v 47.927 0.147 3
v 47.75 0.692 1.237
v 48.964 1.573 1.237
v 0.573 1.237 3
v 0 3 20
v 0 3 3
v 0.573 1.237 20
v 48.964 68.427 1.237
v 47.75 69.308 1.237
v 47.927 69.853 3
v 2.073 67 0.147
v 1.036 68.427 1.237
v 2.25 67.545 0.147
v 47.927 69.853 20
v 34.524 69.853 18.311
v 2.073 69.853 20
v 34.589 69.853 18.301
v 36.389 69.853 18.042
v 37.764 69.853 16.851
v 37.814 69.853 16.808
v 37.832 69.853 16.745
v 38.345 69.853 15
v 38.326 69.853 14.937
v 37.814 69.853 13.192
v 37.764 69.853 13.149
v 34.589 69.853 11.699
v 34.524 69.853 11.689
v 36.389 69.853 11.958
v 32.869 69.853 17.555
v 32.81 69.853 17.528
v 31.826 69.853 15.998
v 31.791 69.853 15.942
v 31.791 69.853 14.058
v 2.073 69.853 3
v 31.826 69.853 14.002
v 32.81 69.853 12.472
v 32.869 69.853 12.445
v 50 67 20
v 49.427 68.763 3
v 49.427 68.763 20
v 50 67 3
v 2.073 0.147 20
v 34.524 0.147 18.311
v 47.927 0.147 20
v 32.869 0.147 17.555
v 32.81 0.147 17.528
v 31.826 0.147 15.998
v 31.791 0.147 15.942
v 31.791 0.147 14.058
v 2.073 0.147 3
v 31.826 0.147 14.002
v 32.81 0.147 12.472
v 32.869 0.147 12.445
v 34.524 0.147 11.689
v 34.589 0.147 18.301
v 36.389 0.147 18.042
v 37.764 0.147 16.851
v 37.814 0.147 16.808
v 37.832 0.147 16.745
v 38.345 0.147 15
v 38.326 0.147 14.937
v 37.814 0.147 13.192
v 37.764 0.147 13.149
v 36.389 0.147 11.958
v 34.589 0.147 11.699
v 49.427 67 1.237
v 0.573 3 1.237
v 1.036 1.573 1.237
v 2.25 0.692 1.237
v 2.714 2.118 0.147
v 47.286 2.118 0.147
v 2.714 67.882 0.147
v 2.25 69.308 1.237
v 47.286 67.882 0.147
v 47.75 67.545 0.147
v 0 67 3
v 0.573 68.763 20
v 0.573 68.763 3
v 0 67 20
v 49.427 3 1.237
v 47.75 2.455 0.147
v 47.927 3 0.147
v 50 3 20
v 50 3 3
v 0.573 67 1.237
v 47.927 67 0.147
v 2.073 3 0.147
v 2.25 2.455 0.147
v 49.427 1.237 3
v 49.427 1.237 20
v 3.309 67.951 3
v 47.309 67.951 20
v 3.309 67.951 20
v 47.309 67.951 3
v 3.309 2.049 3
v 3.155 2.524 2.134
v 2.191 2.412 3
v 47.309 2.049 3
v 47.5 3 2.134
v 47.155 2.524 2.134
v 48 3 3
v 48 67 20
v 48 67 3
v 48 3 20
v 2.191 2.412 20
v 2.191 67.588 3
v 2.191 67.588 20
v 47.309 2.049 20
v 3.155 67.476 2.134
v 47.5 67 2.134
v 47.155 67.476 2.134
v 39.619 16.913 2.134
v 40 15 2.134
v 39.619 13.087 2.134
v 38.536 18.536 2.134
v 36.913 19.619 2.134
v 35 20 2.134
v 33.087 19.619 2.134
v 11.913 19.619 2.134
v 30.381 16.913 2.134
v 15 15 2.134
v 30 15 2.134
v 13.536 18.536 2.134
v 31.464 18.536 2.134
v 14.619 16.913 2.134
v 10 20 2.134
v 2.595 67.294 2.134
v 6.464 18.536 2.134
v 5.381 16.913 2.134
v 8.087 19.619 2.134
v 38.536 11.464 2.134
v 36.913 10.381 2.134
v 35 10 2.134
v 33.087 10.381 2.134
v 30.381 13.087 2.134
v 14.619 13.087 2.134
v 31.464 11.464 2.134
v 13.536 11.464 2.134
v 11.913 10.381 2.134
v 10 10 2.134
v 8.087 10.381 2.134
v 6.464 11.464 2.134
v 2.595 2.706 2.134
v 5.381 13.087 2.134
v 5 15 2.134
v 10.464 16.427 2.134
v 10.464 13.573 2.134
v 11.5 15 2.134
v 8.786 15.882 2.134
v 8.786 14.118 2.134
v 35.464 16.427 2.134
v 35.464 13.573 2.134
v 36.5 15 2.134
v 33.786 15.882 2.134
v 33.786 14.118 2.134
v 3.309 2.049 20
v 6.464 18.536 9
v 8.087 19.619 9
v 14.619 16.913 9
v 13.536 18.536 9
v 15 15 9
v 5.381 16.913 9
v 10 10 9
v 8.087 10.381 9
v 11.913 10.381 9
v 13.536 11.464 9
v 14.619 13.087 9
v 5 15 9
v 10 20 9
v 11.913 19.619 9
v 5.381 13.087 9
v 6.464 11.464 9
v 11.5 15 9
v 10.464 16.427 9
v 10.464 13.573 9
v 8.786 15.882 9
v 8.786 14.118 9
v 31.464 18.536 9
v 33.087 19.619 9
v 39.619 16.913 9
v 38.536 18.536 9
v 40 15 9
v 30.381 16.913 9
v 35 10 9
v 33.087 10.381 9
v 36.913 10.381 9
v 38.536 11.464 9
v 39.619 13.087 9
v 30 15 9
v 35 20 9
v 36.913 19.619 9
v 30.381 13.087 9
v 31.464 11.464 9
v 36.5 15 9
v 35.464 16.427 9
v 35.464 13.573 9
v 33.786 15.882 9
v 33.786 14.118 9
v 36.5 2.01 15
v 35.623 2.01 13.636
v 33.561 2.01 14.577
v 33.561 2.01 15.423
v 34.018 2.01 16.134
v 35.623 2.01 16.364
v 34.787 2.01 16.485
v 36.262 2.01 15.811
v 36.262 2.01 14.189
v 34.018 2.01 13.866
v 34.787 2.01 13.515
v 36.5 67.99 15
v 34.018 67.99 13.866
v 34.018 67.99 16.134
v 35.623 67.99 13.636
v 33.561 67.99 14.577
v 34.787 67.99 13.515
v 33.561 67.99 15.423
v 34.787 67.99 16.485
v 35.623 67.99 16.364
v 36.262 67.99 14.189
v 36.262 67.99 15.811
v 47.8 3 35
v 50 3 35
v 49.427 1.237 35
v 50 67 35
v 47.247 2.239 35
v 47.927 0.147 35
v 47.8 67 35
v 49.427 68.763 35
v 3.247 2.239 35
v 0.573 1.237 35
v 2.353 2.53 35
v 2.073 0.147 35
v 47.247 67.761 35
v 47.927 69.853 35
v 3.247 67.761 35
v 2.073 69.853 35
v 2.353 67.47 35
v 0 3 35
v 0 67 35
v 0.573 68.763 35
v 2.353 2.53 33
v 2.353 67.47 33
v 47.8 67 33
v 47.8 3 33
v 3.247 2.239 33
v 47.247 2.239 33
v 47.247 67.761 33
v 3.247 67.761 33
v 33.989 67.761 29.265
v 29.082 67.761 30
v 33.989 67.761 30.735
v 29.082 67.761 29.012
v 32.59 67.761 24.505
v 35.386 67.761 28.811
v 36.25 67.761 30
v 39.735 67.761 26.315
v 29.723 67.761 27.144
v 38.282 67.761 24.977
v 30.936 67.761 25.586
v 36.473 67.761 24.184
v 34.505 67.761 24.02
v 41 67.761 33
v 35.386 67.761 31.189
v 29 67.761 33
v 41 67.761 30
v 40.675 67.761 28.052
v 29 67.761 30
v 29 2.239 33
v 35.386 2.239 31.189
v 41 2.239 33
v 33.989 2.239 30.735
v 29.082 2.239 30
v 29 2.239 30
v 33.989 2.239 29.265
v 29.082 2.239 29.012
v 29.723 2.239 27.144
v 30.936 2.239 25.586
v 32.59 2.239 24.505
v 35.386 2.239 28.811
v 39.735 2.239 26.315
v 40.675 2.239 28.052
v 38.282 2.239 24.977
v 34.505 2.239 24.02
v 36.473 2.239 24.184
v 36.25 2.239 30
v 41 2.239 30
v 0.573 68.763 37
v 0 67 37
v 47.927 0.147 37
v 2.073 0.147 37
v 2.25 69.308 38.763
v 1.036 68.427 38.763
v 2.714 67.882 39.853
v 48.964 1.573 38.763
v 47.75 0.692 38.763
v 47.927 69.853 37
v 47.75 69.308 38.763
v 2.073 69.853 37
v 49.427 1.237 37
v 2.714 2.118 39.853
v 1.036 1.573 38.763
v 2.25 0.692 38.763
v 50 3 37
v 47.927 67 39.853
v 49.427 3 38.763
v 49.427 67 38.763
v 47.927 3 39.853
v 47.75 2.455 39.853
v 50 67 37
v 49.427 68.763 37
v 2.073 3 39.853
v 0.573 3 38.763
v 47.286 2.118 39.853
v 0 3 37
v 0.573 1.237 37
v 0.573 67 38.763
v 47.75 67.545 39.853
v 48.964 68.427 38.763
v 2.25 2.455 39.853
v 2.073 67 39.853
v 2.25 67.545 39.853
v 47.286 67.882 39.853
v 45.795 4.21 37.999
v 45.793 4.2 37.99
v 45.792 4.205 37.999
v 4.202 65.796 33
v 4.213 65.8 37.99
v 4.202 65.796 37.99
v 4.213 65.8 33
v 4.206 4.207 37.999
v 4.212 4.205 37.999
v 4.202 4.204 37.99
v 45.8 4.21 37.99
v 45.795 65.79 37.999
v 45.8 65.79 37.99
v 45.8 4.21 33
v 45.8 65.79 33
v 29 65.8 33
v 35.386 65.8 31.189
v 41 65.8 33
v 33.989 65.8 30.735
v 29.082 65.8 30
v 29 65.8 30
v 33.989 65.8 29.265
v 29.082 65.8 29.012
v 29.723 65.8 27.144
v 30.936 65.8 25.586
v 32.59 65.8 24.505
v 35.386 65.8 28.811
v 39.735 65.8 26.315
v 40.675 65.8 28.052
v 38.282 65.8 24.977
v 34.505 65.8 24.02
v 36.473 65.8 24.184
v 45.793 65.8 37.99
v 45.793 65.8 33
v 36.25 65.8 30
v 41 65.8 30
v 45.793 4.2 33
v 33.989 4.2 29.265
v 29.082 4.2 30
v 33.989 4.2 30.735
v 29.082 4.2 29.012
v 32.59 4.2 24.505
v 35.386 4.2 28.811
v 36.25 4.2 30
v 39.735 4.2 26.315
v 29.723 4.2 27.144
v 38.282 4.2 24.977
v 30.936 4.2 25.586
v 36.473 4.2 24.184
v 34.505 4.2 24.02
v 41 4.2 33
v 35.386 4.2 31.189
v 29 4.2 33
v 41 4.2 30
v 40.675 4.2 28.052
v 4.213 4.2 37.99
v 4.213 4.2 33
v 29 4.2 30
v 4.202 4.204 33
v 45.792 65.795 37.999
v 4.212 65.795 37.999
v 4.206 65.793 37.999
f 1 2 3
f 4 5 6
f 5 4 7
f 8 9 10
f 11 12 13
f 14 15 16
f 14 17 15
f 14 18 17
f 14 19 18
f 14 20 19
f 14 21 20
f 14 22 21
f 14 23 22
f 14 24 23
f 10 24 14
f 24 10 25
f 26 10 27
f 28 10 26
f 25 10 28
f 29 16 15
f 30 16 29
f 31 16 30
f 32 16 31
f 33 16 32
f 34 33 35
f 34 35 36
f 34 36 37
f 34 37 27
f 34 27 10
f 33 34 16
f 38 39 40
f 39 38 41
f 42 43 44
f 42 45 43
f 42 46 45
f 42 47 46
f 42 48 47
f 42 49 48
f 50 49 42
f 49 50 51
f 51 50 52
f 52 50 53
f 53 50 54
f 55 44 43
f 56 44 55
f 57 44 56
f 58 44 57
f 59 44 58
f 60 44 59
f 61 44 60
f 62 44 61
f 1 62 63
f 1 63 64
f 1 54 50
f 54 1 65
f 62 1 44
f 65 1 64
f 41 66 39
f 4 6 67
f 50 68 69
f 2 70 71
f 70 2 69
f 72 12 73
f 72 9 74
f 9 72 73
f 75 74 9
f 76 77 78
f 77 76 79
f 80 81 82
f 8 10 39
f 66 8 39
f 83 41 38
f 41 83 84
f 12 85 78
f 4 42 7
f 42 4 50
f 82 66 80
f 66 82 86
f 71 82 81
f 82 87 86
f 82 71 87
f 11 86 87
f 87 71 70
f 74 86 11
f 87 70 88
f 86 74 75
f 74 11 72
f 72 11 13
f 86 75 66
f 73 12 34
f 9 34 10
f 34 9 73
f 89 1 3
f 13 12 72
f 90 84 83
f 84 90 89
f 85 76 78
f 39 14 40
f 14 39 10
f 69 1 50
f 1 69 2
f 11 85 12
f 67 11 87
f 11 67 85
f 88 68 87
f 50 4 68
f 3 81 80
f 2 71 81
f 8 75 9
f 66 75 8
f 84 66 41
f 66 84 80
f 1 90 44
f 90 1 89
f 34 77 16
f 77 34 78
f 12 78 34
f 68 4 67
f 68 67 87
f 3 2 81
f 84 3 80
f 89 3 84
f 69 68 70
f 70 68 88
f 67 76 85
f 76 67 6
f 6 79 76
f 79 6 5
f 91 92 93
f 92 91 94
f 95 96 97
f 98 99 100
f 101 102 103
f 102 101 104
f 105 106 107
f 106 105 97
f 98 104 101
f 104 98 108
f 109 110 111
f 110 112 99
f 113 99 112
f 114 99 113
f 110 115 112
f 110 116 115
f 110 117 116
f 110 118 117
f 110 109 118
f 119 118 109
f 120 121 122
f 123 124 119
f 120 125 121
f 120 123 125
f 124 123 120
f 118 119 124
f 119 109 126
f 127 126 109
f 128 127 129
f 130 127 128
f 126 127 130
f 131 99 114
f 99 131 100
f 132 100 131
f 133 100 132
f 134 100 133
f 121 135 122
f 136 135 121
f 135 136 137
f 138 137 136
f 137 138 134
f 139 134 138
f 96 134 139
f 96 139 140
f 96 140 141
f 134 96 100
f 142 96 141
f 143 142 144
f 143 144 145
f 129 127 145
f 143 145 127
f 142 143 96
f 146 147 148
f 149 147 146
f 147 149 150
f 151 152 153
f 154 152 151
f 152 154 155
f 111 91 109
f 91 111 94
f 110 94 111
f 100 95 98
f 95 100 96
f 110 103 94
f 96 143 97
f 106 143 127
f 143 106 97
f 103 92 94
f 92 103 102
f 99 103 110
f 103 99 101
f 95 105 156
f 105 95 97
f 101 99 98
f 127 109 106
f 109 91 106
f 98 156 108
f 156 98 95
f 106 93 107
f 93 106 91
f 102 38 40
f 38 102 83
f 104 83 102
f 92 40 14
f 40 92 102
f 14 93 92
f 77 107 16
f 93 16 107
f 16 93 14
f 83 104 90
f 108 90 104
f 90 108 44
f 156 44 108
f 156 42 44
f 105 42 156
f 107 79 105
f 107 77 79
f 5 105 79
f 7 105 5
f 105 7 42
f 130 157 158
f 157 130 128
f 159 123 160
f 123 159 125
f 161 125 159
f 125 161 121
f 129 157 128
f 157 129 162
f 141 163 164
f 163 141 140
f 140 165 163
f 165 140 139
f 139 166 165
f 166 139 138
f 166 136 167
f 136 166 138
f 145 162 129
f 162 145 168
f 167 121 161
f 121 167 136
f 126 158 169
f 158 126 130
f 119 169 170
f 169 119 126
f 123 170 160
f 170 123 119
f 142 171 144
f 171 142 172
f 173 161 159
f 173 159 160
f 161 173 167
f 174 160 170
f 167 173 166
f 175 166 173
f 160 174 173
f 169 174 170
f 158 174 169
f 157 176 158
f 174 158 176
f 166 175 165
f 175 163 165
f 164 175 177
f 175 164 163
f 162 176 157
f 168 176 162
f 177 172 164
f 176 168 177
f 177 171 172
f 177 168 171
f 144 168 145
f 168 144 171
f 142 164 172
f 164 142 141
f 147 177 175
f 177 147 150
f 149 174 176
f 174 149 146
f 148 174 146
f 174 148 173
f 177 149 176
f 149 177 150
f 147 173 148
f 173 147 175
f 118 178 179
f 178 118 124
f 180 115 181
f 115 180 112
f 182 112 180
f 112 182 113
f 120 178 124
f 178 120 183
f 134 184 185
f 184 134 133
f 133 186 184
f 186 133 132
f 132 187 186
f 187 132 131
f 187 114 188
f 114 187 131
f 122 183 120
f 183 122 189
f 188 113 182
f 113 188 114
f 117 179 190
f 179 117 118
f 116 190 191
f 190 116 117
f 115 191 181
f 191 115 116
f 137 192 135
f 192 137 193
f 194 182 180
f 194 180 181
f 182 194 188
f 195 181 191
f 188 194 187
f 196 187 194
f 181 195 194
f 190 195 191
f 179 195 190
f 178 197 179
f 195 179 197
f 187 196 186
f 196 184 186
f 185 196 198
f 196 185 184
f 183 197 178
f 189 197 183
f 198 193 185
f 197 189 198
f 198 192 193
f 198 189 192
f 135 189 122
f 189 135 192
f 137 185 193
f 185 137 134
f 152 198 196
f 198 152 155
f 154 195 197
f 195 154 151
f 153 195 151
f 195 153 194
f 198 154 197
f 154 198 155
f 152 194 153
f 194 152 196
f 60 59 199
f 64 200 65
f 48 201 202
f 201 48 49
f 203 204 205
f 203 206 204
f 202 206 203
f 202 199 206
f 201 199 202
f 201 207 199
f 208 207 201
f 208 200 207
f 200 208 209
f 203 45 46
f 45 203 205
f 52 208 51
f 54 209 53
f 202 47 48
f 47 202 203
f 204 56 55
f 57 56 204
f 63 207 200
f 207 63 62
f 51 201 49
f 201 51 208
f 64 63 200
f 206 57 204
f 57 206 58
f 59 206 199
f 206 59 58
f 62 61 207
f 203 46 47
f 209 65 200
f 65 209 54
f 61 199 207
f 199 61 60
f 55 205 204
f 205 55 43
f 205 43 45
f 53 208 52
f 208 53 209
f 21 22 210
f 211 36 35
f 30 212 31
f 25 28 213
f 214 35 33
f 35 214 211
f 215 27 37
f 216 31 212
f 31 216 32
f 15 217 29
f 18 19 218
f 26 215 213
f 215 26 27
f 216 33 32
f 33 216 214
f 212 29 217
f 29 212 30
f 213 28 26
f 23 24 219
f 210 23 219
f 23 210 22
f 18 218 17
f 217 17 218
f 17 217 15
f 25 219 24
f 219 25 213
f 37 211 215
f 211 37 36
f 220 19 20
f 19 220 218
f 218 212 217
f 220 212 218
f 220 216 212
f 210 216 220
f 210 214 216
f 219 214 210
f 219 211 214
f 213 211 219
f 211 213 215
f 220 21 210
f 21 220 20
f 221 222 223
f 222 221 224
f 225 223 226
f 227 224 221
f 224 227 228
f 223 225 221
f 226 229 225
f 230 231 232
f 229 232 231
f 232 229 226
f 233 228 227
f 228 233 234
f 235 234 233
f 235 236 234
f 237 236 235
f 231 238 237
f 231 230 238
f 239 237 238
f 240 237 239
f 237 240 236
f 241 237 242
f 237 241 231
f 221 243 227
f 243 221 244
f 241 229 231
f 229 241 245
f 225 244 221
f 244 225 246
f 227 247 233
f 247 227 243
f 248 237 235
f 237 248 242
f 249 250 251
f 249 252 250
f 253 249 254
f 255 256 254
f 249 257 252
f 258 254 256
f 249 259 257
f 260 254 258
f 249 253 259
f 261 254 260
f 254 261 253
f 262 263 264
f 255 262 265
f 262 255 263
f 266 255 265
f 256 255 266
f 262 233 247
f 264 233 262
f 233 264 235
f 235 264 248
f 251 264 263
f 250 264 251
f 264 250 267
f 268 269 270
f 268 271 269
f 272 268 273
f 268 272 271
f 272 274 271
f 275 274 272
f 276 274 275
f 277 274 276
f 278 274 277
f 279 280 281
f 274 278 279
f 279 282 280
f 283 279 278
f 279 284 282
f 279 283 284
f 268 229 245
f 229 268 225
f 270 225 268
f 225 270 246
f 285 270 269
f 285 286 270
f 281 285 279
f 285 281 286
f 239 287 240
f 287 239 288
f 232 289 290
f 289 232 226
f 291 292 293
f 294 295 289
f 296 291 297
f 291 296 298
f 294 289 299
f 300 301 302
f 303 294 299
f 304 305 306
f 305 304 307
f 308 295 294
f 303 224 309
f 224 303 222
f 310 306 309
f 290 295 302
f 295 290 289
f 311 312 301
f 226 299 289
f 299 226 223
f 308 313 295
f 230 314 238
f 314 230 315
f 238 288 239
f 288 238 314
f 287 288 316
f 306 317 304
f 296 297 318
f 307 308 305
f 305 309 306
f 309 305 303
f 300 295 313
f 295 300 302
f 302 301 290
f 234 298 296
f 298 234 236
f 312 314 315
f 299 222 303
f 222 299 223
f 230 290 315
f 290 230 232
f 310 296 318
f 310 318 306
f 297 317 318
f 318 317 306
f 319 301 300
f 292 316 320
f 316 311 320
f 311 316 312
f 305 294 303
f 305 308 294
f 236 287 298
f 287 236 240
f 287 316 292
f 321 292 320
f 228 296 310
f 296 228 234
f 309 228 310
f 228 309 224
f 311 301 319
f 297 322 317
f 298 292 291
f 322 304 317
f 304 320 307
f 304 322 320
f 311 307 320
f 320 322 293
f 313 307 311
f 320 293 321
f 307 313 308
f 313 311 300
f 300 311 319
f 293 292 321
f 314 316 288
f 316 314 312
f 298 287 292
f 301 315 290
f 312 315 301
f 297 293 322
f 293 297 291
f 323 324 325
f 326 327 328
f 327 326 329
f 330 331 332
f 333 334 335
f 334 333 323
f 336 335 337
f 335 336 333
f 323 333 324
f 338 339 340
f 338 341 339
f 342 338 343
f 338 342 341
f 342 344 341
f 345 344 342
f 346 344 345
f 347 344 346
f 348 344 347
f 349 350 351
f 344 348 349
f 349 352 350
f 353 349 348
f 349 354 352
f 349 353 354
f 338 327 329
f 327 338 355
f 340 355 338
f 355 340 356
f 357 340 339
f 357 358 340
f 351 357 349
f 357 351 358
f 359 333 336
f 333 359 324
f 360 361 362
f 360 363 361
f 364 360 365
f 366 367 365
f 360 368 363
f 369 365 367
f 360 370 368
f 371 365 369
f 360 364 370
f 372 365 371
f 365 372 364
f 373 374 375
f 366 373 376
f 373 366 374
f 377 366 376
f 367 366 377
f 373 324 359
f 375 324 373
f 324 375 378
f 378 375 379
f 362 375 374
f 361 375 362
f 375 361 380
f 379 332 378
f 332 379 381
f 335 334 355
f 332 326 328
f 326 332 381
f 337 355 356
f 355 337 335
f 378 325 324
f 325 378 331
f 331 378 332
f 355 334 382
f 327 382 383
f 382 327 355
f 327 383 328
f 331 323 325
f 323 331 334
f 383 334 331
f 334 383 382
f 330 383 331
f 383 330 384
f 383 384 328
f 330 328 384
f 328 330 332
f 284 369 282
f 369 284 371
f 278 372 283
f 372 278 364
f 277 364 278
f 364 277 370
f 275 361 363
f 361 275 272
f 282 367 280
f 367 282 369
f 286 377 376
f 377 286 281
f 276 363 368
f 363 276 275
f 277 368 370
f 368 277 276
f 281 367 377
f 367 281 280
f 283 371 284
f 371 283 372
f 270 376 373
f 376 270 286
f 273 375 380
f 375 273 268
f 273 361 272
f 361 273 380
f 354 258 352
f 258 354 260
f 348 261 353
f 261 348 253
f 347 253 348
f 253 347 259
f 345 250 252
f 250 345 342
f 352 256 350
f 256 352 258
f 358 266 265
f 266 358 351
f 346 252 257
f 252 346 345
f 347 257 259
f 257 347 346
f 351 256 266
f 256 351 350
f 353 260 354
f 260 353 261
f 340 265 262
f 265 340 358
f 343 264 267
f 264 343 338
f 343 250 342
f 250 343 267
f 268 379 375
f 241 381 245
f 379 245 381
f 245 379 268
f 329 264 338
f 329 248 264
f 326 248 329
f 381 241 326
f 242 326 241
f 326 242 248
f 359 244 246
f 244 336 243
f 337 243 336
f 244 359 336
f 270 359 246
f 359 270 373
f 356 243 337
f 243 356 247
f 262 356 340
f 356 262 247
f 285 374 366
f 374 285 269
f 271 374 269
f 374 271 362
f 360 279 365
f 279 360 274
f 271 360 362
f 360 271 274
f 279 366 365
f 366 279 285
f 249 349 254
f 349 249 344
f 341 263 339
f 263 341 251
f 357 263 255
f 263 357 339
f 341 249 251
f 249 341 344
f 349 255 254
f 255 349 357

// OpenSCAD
// file: rounded_box_lib.scad
use <struct.scad>;

module roundedCuboid(xs,ys,zs,radius) {
    r = max(radius, 0.01);
	    
    hull() {
	for (x = [r, xs-r]) {
	    for (y = [r, ys-r]) {
		for (z = [r, zs-r]) {
		    translate([x,y,z]) sphere(r);
		}
	    }
	}
    }
}

module roundedEdge(xs, ys, zs, radius) {
    r = max(radius, 0.01);
    
    hull() {
	for (x = [r, xs-r]) {
	    for (y = [r, ys-r]) {
		translate([x,y,0]) cylinder(r=r, h=zs);
	    }
	}
    }
}

module cuboidChoice(boxDef, xs, ys, zs, radius) {
    if (v(boxDef, "edgeOnly", 0))
	roundedEdge(xs, ys, zs, radius);
    else
	roundedCuboid(xs, ys, zs, radius);
}

module baseRoundedBox(boxDef) {
    x = v(boxDef, "x");
    y = v(boxDef, "y");
    z = v(boxDef, "lidZ");
    radius = v(boxDef, "radius");
    wall = v(boxDef, "wall");
    
    extraHeight = radius * 2;
    difference() {
	cuboidChoice(boxDef, x,y,z+extraHeight, radius);
	translate([wall, wall, wall]) {
	    cuboidChoice(boxDef, x-wall*2, y-wall*2, z-wall*2 + extraHeight, radius-wall);
	}
	translate([-1,-1, z]) {
	    cube([x+2, y+2, extraHeight+1]);
	}
    }
}

module baseRoundedBoxLid(boxDef) {
    x = v(boxDef, "x");
    y = v(boxDef, "y");
    lidZ = v(boxDef, "lidZ");
    z = v(boxDef, "z") - lidZ;
    radius = v(boxDef, "radius");
    wall = v(boxDef, "wall");
    lipHeight = v(boxDef, "lipHeight");
    lipWidth = v(boxDef, "lipWidth");
    lipGap = v(boxDef, "lipGap");
    

    extraDepth = radius * 2 + lipHeight;
    wallLip = wall+lipWidth+lipGap;

    translate([0,0,lidZ]) {
	difference() {
	    translate([0,0,-extraDepth]) {
		cuboidChoice(boxDef, x,y,z+extraDepth, radius);
	    }
	    translate([wallLip, wallLip, -extraDepth]) {
		cuboidChoice(boxDef, x-wallLip*2, y-wallLip*2, z+extraDepth-wall, radius-wallLip);
	    }
	    difference() {
		translate([-1, -1, -extraDepth-1]) {
		    roundedEdge(x+2, y+2, extraDepth+1, radius+1);
		}
		translate([wall+lipGap, wall+lipGap, -extraDepth-2]) {
		    roundedEdge(x-wall*2-lipGap*2, y-wall*2-lipGap*2, extraDepth+3, radius-wall-lipGap);
		}
	    }
	    translate([-1, -1, -extraDepth-1]) {
		cube([x+2, y+2, extraDepth-lipHeight+1]);
	    }
	}
    }
}

module roundedBox(boxDef) {
    baseRoundedBox(boxDef);
}

module roundedBoxLid(boxDef) {
    baseRoundedBoxLid(boxDef);
}

//$fn=30;

testBox = [
    ["x", 30],
    ["y", 40],
    ["z", 25],
    ["lidZ", 20],
    ["radius", 4],
    ["wall", 1],
    ["lipHeight", 2],
    ["lipWidth", 1],
    ["lipGap", 0.2],
    ];


roundedBox(testBox);

translate([0,0,10])
roundedBoxLid(testBox);
// file: struct.scad
// tool to allow key/value "structs" in openscad

/* 

// create an object that looks like:

obj = [
    ["height", 20],
    ["width", 30],
    ["flange", 1],
    ["offset", 3.2]
    ];

// access with
w = v(obj, "width");
// (w is now 30)

// optionally add a default value:
inset = v(obj, "inset", def=4);
// (inset is now 4)


// in scad values are not mutable but we can "modify" or add to an object with the concat() function
newObj = concat([["inset", 8], ["height", 45]], obj);

newInset = v(newObj, "inset", def=4);
// (newInset is 8)

h = v(newObj, "height");
// h takes the first value of "height" and gets 45

*/

function v(obj, key, def=0) = 
    search([key], obj) == [[]] ? def : obj[search([key], obj)[0]][1];
// main file
use <struct.scad>;
use <rounded_box_lib.scad>;


function addCoreBoxDefs(boxDef) =
    concat(boxDef, [
	       ["radius", 3],
	       ["wall", 2],
	       ["lipHeight", 2],
	       ["lipWidth", 2],
	       ["lipGap", 0.2],
	       ["epsilon", 0.01],
	       ["lidScrew_vOffset", 5], // vertical offset for lid screws
	       ["lidScrew_threadRadius", 2.5 / 2], // tappable screw radius
	       ["lidScrew_radius", 3 / 2], // screw radius
	       ["lidScrew_flangeRadius", 6],
	       ["boss_h", 5],
	       ["boss_ir", 2.5 / 2],
	       ["boss_or", 3.5]
	       ]);

module addBoss(box, boss) {
    x = v(boss, "x");
    y = v(boss, "y");
    z = v(box, "wall");
    eps = v(box, "epsilon");
    innerR = v(boss, "ir", v(box, "boss_ir"));
    outerR = v(boss, "or", v(box, "boss_or"));
    h = v(boss, "h", v(box, "boss_h"));
    
    translate([x,y,z-eps]) {
	difference() {
	    cylinder(h = h+eps, r = outerR);
	    translate([0,0,-eps]) {
		cylinder(h=h+eps*3, r = innerR);
	    }
	}
		
    }
}

function baseX(b) = (v(b, "sizeX")-v(b,"holeSpaceX"))/2 + v(b, "placeX");
function baseY(b) = (v(b, "sizeY")-v(b,"holeSpaceY"))/2 + v(b, "placeY");

function genBossList(board) = [
    for (x = [baseX(board), baseX(board) + v(board, "holeSpaceX")])
	for (y = [baseY(board), baseY(board) + v(board, "holeSpaceY")])
	    concat( [["x", x],
		     ["y", y],
		     ["h", v(board, "z")]], v(board, "extras", []))];

module aboutFaceWall(box, wall) {
    faceWall(box, wall) {
	mirror([0,0,1]) {
	    children();
	}
    }
}

module faceWall(box, wall) {
    x = v(box, "x");
    y = v(box, "y");
    
    if (wall == 0) {
	mirror([0,0,1]) {
	    rotate([-90, 0, 0]) {
		children();
	    }
	}
    }
    if (wall == 1) {
	rotate([0, 0, 90]) {
	    rotate([90, 0, 0]) {
		children();
	    }
	}
    }
    if (wall == 2) {
	translate([0,y,0]) {
	    rotate([90, 0, 0]) {
		children();
	    }
	}
    }
    if (wall == 3) {
	translate([x, 0, 0]) {
	    rotate([90, 0, 90]) {
		mirror([0,0,1]) {
		    children();
		}
	    }
	}
    }
}

module addOuterLidScrew(boxDef, lidScrew) {
    wall = v(lidScrew, "wall"); 
    x = v(lidScrew, "offset");
    vOffset = v(lidScrew, "vOffset", v(boxDef, "lidScrew_vOffset", "wtf"));
    y = v(boxDef, "lidZ") - vOffset;
    screwR = v(lidScrew, "radius", v(boxDef, "lidScrew_radius"));
    eps = v(boxDef, "epsilon");
    h = v(boxDef, "wall");
    faceWall(boxDef, wall) {
	translate([x, y, -eps]) {
	    cylinder(r1=screwR + h, r2=screwR, h=h+eps*2);
	}
    }
}

module addLidScrewFlange(box, ls, depth) {
    vOffset = v(ls, "vOffset", v(box, "lidScrew_vOffset"));
    offset = v(ls, "offset");
    r = v(ls, "flangeRadius", v(box, "lidScrew_flangeRadius"));
    
    faceWall(box, v(ls, "wall")) {
	translate([offset, -vOffset, -1]) {
	    cylinder(r = r, h = depth+1);
	    translate([-r, 0, 0])
		cube([r*2, vOffset+1, depth+1]);
	}
    }
}

module addLidScrewHole(box, ls, depth) {
    vOffset = v(ls, "vOffset", v(box, "lidScrew_vOffset"));
    offset = v(ls, "offset");
    r = v(ls, "threadRadius", v(box, "lidScrew_threadRadius"));
    faceWall(box, v(ls, "wall")) {
	translate([offset, -vOffset, 0])
	    cylinder(r=r, h=depth);
    }
}


module projectBox(boxDef) {
    box = addCoreBoxDefs(boxDef);

    difference() {
	union() {
	    roundedBox(box);
	    for (boss = v(box, "bossList", [])) {
		addBoss(box, boss);
	    }
	    
	}
	for (lidScrew = v(box, "lidScrewList", [])) {
	    addOuterLidScrew(box, lidScrew);
	}
    }
}


function maxFlangeDepth(box) =
    max(concat([v(box, "lidScrew_vOffset") + v(box, "lidScrew_flangeRadius")],
	       [for (ls = v(box, "lidScrewList", []))
		       v(ls, "vOffset", v(box, "lidScrew_vOffset")) +
		       v(ls, "flangeRadius", v(box, "lidScrew_flangeRadius"))
		   ]));
		    
module screwFlanges(box, flangeInset) {
    mfd = maxFlangeDepth(box);
    lh = v(box, "lipHeight");
    difference() {
	translate([0, 0, -1 - mfd]) {
	    cube([v(box, "x"), v(box, "y"), mfd - lh + 1]);
	}
	for (ls = v(box, "lidScrewList", [])) {
	    addLidScrewFlange(box, ls, flangeInset);
	}
    }
}


module projectBoxLid(boxDef) {
    box = addCoreBoxDefs(boxDef);
    lipHeightOverride = maxFlangeDepth(box);
    baseLidDef = concat([["lipHeight", lipHeightOverride]], box);

    flangeInset = v(box, "wall") + v(box, "lipGap") + v(box, "lipWidth") + v(box, "epsilon");
    
    difference() {
	union() {
	    roundedBoxLid(baseLidDef);
	}
	translate([0, 0, v(box, "lidZ")]) {
	    screwFlanges(box, flangeInset);
	    for (lidScrew = v(box, "lidScrewList", [])) {
		addLidScrewHole(box, lidScrew, flangeInset);
	    }
	}
    }
}

module showBoard(boxDef, board) {
    box = addCoreBoxDefs(boxDef);
    %translate([0, 0, v(box, "wall")]) {
	translate([v(board, "placeX"), v(board, "placeY"), v(board, "z")]) {
	    cube([v(board, "sizeX"), v(board, "sizeY"), v(board, "thick")]);
	}
    }
}
		     
boss1 = [
    ["x", 10],
    ["y", 15],
    ["h", 7],
    ["or", 5],
    ["ir", 1.5],
    ];

boss2 = concat([["x", 35]], boss1);

lidScrew1 = [
    ["wall", 0],
    ["offset", 35]
    ];

lidScrew2 = concat([["wall", 2]], lidScrew1);


testBox = [
    ["x", 50],
    ["y", 70],
    ["z", 25],
    ["lidZ", 20],
    ["bossList", [boss1, boss2]],
    ["lidScrewList", [lidScrew1, lidScrew2]]
    ];

projectBox(testBox);
translate([0,0,15])
projectBoxLid(testBox);
